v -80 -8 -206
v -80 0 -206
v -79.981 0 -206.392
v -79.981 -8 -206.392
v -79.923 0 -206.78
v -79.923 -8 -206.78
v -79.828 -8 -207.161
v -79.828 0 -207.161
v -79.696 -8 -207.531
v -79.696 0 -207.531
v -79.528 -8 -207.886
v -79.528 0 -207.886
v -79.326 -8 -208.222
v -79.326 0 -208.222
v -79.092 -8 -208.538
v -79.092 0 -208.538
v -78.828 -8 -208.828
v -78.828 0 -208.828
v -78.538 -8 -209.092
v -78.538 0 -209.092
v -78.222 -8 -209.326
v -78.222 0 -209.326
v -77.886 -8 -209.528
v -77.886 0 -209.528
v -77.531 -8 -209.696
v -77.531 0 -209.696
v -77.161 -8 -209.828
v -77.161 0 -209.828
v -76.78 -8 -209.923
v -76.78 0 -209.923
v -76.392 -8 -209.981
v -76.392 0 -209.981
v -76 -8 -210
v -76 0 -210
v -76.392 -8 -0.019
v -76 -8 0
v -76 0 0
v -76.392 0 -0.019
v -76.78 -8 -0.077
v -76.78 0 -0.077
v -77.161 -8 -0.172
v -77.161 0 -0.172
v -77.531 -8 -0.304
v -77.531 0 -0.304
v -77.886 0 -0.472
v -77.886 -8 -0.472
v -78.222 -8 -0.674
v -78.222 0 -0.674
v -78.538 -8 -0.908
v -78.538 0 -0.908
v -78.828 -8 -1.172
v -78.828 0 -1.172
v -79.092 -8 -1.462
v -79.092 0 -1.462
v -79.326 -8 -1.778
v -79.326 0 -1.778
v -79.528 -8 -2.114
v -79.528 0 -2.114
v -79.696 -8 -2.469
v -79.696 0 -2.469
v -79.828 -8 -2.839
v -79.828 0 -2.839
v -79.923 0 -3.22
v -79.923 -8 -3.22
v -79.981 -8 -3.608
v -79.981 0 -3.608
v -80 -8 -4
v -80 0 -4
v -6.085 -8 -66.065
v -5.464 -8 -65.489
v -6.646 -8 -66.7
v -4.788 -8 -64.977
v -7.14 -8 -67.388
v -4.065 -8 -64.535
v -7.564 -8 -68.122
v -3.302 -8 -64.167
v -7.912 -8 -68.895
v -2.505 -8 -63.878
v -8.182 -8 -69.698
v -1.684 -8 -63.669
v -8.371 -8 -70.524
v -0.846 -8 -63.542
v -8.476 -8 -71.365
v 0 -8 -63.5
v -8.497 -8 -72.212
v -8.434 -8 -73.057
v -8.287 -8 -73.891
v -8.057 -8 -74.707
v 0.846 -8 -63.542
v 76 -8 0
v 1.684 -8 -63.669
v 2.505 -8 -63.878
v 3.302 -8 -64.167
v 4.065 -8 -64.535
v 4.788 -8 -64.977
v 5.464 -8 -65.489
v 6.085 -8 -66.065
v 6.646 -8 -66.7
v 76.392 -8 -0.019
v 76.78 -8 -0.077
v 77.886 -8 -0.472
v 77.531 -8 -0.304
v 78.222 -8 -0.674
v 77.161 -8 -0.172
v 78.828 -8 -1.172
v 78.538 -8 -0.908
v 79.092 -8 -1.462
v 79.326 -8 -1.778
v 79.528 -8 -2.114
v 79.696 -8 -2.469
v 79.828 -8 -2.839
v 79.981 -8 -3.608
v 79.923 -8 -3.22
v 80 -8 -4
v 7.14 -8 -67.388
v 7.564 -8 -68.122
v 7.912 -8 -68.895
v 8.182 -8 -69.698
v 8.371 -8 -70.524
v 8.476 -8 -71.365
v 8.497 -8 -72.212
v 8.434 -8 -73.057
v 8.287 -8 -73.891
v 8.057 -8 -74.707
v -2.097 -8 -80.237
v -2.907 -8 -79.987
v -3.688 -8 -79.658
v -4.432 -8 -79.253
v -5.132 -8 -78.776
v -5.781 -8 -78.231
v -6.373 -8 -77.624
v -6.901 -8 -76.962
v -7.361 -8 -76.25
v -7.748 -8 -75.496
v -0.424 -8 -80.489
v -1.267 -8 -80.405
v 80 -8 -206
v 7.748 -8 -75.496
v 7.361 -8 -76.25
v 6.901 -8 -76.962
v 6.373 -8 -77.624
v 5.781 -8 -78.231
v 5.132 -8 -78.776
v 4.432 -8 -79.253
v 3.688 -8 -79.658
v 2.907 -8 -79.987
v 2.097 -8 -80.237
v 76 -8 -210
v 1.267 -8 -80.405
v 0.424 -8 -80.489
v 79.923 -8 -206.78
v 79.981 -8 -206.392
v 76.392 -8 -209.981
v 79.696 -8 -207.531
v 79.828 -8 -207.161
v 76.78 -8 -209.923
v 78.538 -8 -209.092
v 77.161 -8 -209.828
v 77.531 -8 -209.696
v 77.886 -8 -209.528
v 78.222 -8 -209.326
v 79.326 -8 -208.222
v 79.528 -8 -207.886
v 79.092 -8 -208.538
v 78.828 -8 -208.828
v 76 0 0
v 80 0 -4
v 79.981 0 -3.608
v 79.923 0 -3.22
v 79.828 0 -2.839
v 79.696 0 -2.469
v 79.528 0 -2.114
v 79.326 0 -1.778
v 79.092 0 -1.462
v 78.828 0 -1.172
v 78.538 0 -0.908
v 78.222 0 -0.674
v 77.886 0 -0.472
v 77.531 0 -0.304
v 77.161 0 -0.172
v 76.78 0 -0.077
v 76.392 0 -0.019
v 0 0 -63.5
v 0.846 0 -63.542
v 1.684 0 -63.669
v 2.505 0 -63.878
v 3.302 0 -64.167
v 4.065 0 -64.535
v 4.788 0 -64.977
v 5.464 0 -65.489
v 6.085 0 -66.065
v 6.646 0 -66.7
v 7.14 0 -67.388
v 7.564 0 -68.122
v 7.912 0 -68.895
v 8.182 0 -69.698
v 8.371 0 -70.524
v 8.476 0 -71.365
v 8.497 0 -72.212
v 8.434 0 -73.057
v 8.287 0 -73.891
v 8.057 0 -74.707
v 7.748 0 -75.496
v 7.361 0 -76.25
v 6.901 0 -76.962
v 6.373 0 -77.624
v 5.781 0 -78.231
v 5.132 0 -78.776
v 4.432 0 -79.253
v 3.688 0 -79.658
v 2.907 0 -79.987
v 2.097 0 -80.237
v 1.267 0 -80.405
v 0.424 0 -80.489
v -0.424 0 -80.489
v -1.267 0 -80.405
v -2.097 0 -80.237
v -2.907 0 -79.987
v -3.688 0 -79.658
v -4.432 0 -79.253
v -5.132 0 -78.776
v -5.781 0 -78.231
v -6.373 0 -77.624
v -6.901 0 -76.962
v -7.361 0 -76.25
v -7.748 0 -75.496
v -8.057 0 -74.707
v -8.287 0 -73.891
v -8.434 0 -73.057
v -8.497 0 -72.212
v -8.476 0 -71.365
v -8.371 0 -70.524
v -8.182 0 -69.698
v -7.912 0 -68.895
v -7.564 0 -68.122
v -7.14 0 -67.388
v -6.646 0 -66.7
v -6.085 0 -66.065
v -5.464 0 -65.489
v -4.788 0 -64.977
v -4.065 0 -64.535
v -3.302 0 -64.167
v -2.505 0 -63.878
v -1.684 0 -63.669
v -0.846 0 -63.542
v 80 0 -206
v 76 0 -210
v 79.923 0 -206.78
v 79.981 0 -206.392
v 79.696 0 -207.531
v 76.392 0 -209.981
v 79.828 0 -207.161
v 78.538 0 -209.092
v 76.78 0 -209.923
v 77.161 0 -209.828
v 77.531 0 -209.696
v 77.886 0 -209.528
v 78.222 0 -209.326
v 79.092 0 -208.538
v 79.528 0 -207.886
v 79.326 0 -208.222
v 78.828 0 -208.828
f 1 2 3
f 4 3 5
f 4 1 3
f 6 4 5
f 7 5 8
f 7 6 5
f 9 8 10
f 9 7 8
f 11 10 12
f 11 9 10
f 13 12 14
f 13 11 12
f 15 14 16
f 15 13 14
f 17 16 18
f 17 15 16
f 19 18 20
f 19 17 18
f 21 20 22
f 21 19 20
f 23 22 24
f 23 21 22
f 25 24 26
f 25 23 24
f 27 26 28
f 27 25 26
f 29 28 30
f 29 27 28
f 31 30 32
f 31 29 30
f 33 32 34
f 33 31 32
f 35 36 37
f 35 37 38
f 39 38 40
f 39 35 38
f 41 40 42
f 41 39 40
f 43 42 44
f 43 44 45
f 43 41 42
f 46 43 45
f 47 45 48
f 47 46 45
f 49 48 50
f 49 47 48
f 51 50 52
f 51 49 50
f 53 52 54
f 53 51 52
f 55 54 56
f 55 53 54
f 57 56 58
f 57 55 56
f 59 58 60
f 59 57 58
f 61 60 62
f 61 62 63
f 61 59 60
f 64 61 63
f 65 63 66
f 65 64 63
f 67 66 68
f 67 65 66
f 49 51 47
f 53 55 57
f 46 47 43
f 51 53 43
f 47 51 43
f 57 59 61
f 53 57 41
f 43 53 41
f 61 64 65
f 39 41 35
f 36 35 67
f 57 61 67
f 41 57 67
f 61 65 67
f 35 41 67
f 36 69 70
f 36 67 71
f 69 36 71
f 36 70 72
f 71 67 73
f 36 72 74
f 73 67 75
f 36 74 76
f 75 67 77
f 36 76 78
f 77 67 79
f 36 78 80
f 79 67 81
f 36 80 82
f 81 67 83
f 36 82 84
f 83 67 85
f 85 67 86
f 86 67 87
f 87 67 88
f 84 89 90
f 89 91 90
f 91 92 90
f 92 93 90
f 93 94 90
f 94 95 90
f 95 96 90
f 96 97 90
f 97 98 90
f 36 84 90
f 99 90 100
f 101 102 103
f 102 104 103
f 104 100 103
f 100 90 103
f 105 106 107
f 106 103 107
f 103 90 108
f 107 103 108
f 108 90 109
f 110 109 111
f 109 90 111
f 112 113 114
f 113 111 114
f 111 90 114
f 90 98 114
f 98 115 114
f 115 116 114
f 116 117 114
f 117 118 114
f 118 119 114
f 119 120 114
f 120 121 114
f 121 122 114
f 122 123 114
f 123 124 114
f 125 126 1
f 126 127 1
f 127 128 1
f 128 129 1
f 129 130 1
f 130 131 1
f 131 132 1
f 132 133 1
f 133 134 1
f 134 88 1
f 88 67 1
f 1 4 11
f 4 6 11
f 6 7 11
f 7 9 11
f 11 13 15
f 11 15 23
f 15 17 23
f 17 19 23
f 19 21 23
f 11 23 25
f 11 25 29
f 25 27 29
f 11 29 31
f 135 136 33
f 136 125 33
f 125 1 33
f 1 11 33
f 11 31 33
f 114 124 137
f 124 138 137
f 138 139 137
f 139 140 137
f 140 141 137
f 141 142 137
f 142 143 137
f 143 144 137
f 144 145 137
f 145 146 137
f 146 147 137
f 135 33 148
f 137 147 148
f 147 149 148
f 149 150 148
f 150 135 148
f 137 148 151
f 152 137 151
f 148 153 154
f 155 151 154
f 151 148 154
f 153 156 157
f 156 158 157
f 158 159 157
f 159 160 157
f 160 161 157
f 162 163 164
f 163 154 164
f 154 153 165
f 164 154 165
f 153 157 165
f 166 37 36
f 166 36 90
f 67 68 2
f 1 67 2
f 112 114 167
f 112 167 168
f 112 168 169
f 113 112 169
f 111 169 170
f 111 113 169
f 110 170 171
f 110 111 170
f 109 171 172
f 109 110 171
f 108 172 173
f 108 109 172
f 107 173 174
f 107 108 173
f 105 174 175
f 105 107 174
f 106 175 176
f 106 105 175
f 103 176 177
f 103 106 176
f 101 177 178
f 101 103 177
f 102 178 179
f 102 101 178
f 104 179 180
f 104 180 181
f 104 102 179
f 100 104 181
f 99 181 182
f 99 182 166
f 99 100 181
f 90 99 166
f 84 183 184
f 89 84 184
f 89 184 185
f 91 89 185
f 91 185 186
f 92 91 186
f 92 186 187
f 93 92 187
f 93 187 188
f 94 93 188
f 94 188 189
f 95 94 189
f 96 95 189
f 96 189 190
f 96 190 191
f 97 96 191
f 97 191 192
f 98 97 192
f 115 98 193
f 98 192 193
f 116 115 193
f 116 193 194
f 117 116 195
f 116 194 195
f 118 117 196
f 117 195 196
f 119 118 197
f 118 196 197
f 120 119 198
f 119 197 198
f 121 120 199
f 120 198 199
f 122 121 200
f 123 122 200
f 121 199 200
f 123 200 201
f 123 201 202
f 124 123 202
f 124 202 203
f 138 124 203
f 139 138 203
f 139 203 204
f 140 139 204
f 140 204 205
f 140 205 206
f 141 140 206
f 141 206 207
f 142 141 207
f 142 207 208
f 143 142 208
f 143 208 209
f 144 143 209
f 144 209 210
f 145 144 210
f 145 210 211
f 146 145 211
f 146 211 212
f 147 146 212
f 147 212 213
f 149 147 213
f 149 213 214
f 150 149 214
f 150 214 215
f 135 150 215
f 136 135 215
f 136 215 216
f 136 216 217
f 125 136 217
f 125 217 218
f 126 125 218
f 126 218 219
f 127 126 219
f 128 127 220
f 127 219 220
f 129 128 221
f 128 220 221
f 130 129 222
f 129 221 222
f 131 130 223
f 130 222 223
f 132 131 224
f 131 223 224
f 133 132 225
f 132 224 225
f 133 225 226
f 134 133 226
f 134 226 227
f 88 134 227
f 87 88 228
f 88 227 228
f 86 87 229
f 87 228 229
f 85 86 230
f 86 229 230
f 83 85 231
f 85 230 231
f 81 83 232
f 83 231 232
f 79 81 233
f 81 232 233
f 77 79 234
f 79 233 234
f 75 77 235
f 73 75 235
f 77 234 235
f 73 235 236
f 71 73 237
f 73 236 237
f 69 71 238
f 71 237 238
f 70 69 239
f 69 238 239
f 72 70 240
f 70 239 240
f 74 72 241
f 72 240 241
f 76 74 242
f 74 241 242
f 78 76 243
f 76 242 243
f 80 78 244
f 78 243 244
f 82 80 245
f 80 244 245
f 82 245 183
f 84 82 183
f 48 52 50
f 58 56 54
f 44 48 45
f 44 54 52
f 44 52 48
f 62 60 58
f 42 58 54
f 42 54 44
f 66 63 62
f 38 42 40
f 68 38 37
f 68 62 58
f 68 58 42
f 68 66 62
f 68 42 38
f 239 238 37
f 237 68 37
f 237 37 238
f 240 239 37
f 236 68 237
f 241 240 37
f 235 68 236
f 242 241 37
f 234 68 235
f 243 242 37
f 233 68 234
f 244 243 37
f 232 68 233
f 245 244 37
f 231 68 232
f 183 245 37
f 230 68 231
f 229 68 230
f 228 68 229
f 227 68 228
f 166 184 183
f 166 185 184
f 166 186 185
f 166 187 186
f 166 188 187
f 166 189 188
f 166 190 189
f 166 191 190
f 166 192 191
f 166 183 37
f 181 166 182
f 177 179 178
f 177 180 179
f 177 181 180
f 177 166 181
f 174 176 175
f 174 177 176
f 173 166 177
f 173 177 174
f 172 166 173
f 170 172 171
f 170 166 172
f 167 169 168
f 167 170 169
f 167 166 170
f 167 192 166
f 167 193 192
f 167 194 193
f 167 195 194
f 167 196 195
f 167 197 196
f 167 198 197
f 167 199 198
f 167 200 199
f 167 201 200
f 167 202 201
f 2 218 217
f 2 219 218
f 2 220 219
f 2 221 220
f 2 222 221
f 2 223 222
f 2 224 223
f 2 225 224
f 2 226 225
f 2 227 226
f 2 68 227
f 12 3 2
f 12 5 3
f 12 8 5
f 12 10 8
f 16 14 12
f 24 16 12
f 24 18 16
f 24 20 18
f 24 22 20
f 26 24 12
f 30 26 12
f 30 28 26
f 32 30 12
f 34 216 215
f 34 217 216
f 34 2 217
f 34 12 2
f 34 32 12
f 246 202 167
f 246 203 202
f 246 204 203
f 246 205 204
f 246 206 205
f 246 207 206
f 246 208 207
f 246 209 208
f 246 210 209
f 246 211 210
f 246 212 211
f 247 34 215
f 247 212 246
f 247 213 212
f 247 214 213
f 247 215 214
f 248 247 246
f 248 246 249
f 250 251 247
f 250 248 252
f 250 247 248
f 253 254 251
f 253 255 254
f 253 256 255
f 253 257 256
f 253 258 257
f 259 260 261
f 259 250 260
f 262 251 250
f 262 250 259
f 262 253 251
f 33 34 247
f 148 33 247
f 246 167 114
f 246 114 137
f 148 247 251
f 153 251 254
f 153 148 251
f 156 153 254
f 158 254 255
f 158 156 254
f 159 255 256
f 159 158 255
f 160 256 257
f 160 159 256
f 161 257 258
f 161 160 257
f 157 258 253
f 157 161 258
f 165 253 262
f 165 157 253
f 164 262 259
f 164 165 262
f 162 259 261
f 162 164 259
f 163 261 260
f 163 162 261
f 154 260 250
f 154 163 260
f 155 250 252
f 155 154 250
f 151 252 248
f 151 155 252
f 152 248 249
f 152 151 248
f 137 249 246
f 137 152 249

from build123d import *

# Parameters (mm, degrees)
IZIM1_W               = 160
IZIM1_H               = 210
TABAN_FLAN_1_DEPTH    = 8
K_ELERI_START         = -8
K_ELERI_K_R1_DEPTH    = 8
IZIM6_R               = 8.5
KES_EKSTR_ZYON1_DEPTH = 10


# Read off the part's stored shape, not the designer's step: Köşeleri kır1
# Sheet-metal steps are written as plain solids
with BuildPart() as part:
    # Çizim1 → Taban-Flanş1 (new body)
    with BuildSketch(Plane(origin=(0, 0, 0), x_dir=(1, 0, 0), z_dir=(0, 1, 0))):
        with Locations((0, 105)):
            Rectangle(IZIM1_W, IZIM1_H)
    extrude(amount=-TABAN_FLAN_1_DEPTH)

    # Köşeleri kır1 outline → Köşeleri kır1 (cut)
    with BuildSketch(Plane(origin=(0, 0, 0), x_dir=(1, 0, 0), z_dir=(0, 1, 0)).offset(K_ELERI_START)):
        with BuildLine():
            ThreePointArc((-80, 206), (-78.828427125, 208.828427125), (-76, 210))
            Line((-76, 210), (-80, 210))
            Line((-80, 210), (-80, 206))
        make_face()
        with BuildLine():
            Line((80, 210), (76, 210))
            ThreePointArc((76, 210), (78.828427125, 208.828427125), (80, 206))
            Line((80, 206), (80, 210))
        make_face()
        with BuildLine():
            ThreePointArc((-76, 0), (-78.828427125, 1.171572875), (-80, 4))
            Line((-80, 4), (-80, 0))
            Line((-80, 0), (-76, 0))
        make_face()
        with BuildLine():
            Line((80, 0), (80, 4))
            ThreePointArc((80, 4), (78.828427125, 1.171572875), (76, 0))
            Line((76, 0), (80, 0))
        make_face()
    extrude(amount=K_ELERI_K_R1_DEPTH, mode=Mode.SUBTRACT)

    # Çizim6 → Kes-Ekstrüzyon1 (cut)
    with BuildSketch(Plane(origin=(0, 0, 0), x_dir=(1, 0, 0), z_dir=(0, 1, 0))):
        with Locations(Location((0, 72, 0), (0, 0, 270))):
            Circle(IZIM6_R)
    extrude(amount=-KES_EKSTR_ZYON1_DEPTH, mode=Mode.SUBTRACT)


solid = part.part
